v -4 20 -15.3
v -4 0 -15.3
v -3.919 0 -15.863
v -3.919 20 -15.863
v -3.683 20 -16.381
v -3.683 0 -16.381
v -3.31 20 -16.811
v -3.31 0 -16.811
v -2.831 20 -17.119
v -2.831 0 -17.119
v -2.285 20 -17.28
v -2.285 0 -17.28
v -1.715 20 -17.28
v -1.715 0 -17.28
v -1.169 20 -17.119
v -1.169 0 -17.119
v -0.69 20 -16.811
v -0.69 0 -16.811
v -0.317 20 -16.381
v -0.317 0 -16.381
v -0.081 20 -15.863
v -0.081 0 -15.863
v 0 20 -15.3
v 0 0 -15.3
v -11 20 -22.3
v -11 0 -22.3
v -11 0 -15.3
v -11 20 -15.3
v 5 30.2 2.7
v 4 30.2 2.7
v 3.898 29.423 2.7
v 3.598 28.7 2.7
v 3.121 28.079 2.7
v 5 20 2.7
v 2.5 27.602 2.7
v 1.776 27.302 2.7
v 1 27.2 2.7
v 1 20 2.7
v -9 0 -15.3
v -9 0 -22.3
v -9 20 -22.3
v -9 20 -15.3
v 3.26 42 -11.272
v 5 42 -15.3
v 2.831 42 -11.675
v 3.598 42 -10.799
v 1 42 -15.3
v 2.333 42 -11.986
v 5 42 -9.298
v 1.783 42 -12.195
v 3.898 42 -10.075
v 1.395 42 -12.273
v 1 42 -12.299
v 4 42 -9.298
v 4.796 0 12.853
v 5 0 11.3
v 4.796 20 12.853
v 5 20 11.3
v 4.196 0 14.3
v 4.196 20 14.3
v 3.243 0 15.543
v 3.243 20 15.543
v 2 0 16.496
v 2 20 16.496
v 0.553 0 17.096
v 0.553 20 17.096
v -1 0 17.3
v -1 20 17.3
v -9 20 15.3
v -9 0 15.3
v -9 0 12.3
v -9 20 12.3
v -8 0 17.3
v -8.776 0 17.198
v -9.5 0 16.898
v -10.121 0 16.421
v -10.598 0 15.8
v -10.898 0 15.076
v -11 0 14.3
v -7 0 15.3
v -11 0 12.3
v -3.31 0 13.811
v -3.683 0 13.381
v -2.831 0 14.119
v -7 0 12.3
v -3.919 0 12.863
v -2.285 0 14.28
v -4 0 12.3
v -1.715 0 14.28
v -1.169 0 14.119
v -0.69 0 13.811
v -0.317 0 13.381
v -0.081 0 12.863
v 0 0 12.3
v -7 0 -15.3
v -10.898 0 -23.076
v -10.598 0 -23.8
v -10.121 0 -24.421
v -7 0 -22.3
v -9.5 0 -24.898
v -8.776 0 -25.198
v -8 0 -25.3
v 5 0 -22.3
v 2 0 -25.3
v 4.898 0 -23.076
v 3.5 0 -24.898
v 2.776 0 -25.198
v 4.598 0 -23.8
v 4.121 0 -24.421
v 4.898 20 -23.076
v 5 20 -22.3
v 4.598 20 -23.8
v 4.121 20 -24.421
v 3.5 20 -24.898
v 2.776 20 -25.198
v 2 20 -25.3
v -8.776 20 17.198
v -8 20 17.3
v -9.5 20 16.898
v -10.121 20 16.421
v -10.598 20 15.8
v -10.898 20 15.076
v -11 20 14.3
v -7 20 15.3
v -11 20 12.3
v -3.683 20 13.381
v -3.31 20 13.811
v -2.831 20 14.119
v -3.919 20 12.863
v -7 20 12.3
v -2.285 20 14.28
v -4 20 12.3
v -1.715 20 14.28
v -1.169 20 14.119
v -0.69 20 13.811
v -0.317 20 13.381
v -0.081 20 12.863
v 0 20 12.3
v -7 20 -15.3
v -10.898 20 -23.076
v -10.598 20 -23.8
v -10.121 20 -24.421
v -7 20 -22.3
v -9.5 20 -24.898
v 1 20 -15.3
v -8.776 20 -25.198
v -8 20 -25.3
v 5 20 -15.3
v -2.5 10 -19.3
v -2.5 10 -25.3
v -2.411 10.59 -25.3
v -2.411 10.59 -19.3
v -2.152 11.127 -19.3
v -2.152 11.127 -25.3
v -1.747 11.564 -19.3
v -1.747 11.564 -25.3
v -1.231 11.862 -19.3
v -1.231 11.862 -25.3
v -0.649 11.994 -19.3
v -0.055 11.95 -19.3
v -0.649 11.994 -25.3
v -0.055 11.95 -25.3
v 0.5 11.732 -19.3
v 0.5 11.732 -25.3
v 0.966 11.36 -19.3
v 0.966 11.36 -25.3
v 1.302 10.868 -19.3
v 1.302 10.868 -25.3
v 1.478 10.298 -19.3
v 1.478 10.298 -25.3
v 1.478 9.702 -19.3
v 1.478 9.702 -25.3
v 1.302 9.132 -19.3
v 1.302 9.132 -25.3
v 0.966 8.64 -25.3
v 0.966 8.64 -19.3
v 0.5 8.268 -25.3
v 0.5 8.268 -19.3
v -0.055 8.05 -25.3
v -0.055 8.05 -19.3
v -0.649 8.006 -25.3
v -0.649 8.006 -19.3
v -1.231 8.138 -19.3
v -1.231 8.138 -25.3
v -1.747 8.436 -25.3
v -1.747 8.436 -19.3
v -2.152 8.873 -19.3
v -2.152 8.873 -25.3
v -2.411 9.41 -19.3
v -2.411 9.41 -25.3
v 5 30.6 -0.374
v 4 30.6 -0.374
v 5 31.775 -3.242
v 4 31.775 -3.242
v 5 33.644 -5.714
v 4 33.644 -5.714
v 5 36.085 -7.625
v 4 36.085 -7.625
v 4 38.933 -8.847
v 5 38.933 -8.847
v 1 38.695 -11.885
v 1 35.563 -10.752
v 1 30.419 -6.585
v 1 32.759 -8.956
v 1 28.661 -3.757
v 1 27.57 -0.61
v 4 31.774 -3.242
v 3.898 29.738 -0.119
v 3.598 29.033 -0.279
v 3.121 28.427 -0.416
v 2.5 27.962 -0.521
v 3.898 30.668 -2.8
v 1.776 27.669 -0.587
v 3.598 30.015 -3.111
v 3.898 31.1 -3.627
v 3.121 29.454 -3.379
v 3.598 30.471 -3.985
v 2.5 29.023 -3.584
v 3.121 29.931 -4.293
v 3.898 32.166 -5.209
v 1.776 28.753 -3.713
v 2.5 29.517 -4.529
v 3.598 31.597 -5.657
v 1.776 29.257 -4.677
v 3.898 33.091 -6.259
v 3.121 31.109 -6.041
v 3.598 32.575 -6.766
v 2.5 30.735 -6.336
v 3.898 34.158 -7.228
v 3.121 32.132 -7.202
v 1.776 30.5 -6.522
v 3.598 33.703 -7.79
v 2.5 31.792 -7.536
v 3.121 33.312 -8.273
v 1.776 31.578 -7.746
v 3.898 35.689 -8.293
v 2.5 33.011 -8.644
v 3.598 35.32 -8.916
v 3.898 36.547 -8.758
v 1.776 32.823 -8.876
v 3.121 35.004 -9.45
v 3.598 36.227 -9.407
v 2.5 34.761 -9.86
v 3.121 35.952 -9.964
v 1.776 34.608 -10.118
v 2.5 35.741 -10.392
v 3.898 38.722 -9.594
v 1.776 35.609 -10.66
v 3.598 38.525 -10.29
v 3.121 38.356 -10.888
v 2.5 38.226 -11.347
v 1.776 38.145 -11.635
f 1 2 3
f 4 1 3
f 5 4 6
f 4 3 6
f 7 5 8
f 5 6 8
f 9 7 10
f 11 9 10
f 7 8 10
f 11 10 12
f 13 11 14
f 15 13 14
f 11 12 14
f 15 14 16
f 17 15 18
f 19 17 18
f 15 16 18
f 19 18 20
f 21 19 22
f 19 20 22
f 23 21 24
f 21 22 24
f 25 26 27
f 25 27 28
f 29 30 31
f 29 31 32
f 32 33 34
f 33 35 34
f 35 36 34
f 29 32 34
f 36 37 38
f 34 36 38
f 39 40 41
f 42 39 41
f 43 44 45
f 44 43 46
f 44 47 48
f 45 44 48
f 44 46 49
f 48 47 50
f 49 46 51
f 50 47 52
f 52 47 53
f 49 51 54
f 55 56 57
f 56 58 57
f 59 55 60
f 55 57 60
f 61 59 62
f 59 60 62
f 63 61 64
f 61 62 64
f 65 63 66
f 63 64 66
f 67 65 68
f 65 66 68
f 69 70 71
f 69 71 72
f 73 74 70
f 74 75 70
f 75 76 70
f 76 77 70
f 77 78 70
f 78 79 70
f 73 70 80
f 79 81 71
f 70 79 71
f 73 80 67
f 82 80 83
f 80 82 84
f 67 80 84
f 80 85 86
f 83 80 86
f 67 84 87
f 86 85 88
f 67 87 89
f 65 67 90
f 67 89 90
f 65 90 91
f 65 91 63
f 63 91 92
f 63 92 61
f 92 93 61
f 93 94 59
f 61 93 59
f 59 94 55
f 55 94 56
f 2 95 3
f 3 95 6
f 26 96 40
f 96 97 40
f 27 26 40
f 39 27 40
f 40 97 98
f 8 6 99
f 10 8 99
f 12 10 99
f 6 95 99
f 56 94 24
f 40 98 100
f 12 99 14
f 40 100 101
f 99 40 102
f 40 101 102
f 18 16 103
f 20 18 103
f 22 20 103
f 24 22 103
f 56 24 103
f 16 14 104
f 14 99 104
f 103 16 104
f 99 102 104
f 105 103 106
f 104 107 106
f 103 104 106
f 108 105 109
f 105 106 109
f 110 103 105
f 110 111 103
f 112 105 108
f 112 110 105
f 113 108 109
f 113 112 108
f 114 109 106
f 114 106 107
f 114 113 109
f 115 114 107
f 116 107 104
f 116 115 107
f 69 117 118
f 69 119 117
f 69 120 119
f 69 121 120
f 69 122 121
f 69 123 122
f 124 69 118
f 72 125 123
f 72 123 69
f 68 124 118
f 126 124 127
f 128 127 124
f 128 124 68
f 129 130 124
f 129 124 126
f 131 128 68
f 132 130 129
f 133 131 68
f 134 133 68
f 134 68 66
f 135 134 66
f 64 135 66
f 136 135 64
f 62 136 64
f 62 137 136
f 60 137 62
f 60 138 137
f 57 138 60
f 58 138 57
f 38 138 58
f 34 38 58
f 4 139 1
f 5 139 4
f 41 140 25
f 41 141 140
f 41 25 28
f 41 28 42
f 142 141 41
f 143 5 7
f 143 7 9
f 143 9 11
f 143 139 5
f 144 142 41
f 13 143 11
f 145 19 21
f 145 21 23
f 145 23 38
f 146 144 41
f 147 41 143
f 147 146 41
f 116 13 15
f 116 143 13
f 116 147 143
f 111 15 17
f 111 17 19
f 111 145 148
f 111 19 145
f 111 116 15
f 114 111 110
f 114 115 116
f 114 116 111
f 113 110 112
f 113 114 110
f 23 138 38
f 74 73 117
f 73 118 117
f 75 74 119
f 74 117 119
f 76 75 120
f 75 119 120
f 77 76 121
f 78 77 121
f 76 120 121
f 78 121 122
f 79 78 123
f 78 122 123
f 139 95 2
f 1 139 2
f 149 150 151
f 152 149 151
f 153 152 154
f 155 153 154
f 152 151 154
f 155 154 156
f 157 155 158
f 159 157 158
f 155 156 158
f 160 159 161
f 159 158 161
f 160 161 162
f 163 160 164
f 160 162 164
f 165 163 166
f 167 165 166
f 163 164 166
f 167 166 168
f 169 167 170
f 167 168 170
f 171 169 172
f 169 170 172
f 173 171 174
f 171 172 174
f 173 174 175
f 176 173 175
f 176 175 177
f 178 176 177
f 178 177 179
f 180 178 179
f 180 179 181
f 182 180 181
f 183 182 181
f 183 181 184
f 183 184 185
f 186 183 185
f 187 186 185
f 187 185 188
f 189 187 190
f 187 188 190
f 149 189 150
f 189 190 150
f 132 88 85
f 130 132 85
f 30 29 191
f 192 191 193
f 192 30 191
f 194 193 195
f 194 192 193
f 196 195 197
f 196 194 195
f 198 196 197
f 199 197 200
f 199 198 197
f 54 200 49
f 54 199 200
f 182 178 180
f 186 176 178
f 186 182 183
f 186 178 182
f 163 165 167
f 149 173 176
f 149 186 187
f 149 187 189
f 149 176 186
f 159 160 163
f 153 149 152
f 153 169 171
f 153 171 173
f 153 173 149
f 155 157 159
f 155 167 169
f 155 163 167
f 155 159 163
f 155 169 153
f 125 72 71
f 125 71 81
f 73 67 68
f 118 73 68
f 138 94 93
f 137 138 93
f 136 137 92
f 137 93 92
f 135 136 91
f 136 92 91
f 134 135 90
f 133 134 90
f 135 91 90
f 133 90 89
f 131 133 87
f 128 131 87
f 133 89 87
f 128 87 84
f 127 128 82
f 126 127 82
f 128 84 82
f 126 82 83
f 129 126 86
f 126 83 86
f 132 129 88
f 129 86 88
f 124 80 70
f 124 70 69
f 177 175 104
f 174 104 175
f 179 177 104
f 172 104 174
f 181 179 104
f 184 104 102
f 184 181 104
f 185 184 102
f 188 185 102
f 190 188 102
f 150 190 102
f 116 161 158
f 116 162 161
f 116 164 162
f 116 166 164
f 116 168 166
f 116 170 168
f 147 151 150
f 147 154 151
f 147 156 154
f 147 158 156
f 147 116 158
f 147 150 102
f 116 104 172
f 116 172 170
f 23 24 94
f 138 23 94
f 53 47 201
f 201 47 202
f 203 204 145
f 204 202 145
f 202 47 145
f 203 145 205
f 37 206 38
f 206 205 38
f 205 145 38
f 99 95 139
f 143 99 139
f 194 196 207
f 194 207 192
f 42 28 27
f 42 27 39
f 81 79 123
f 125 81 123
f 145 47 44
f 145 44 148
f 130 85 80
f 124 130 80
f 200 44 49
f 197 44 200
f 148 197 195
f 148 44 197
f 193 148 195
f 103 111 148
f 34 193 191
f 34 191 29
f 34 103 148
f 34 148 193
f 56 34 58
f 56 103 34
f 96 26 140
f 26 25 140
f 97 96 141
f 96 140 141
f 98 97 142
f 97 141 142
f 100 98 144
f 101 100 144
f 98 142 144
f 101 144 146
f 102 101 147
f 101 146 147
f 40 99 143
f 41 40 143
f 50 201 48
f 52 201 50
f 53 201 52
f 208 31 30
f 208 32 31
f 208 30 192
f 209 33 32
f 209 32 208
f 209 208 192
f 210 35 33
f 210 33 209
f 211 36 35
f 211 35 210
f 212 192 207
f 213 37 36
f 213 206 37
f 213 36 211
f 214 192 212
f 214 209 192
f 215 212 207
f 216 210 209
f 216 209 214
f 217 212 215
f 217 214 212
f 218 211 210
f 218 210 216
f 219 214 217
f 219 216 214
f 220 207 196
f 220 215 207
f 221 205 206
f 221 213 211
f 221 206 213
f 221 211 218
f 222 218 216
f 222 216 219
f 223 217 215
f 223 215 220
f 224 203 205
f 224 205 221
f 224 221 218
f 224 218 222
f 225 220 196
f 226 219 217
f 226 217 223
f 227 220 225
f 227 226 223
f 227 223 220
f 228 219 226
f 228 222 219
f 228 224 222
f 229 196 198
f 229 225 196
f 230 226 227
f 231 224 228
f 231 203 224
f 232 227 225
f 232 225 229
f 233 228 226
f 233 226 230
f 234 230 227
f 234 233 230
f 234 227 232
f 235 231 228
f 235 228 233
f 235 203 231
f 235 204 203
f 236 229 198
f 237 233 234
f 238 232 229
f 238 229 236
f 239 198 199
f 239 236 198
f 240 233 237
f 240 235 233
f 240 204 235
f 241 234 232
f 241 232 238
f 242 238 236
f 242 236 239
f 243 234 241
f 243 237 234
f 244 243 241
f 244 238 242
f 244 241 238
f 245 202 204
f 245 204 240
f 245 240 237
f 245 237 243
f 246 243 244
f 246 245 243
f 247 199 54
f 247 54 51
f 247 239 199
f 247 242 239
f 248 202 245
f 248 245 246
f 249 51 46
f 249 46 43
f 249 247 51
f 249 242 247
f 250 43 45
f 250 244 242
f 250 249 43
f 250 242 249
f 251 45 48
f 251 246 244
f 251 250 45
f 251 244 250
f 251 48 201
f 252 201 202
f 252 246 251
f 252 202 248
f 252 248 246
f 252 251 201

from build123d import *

# Parameters (mm, degrees)
BOSS_EXTRUDE1_DEPTH  = 20
SKETCH3_W            = 12
SKETCH3_H            = 20
BOSS_EXTRUDE2_DEPTH  = 5
FILLET1_R            = 6
FILLET2_R            = 3
SKETCH4_R            = 2
CUT_EXTRUDE1_DEPTH   = 6
SKETCH5_W            = 2
SKETCH5_H            = 20
SKETCH5_W_2          = 3
BOSS_EXTRUDE3_DEPTH  = 4
SKETCH6_W            = 2
SKETCH6_H            = 20
BOSS_EXTRUDE4_DEPTH  = 3
SKETCH7_W            = 2
SKETCH7_H            = 20
BOSS_EXTRUDE5_DEPTH  = 7
FILLET3_R            = 3
SKETCH8_W            = 18
SKETCH8_H            = 22
BOSS_EXTRUDE6_DEPTH  = 5
CUT_EXTRUDE2_START   = -4
CUT_EXTRUDE2_DEPTH   = 40.285832851
CUT_EXTRUDE3_DEPTH   = 36.285832851
FILLET4_R            = 3
SKETCH11_W           = 18
SKETCH11_H           = 22
CUT_EXTRUDE4_DEPTH   = 1
FILLET5_R            = 3
FILLET4_OF_MIRROR1_R = 3
SKETCH12_W           = 16.003556493
SKETCH12_H           = 33.094462643
CUT_EXTRUDE5_DEPTH   = 22


with BuildPart() as part:
    # Sketch1 → Boss-Extrude1 (new body)
    with BuildSketch(Plane(origin=(0, 0, 0), x_dir=(1, 0, 0), z_dir=(0, 1, 0))):
        with BuildLine():
            Line((0, 15.3), (0, -12.3))
            ThreePointArc((0, -12.3), (-2, -14.3), (-4, -12.3))
            Line((-4, -12.3), (-7, -12.3))
            Line((-7, -12.3), (-7, -17.3))
            Line((-7, -17.3), (5, -17.3))
            Line((5, -17.3), (5, 20.3))
            Line((5, 20.3), (-7, 20.3))
            Line((-7, 20.3), (-7, 15.3))
            Line((-7, 15.3), (-4, 15.3))
            ThreePointArc((-4, 15.3), (-2, 17.3), (0, 15.3))
        make_face()
    extrude(amount=BOSS_EXTRUDE1_DEPTH)

    # Sketch3 → Boss-Extrude2 (add)
    with BuildSketch(Plane(origin=(0, 0, -20.3), x_dir=(-1, 0, 0), z_dir=(0, 0, -1))):
        with Locations((1, 10)):
            Rectangle(SKETCH3_W, SKETCH3_H)
    extrude(amount=BOSS_EXTRUDE2_DEPTH)

    # Fillet1
    fillet1_edges = [part.edges().sort_by_distance(p)[0] for p in [
        (5, 10, 17.3),
    ]]
    fillet(fillet1_edges, radius=FILLET1_R)

    # Fillet2
    fillet2_edges = [part.edges().sort_by_distance(p)[0] for p in [
        (5, 10, -25.3),
    ]]
    fillet(fillet2_edges, radius=FILLET2_R)

    # Sketch4 → Cut-Extrude1 (cut)
    with BuildSketch(Plane(origin=(0, 0, -25.3), x_dir=(-1, 0, 0), z_dir=(0, 0, -1))):
        with Locations((0.5, 10)):
            Circle(SKETCH4_R)
    extrude(amount=-CUT_EXTRUDE1_DEPTH, mode=Mode.SUBTRACT)

    # Sketch5 → Boss-Extrude3 (add)
    with BuildSketch(Plane.ZY.offset(7)):
        with Locations((16.3, 10)):
            Rectangle(SKETCH5_W, SKETCH5_H)
        with Locations((-23.8, 10)):
            Rectangle(SKETCH5_W_2, SKETCH5_H)
    extrude(amount=BOSS_EXTRUDE3_DEPTH)

    # Sketch6 → Boss-Extrude4 (add)
    with BuildSketch(Plane(origin=(0, 0, 15.3), x_dir=(-1, 0, 0), z_dir=(0, 0, -1))):
        with Locations((10, 10)):
            Rectangle(SKETCH6_W, SKETCH6_H)
    extrude(amount=BOSS_EXTRUDE4_DEPTH)

    # Sketch7 → Boss-Extrude5 (add)
    with BuildSketch(Plane.XY.offset(-22.3)):
        with Locations((-10, 10)):
            Rectangle(SKETCH7_W, SKETCH7_H)
    extrude(amount=BOSS_EXTRUDE5_DEPTH)

    # Fillet3
    fillet3_edges = [part.edges().sort_by_distance(p)[0] for p in [
        (-11, 10, 17.3),
        (-11, 10, -25.3),
    ]]
    fillet(fillet3_edges, radius=FILLET3_R)

    # Sketch8 → Boss-Extrude6 (add)
    with BuildSketch(Plane.ZY):
        with Locations((-6.3, -11)):
            Rectangle(SKETCH8_W, SKETCH8_H)
    boss_extrude6 = extrude(amount=-BOSS_EXTRUDE6_DEPTH)

    # Sketch9 → Cut-Extrude2 (cut)
    with BuildSketch(Plane.ZY.offset(CUT_EXTRUDE2_START)):
        with BuildLine():
            Line((2.7, -10.2), (2.7, -7.2))
            ThreePointArc((2.7, -7.2), (-7.835653753, -11.522921748), (-12.298666607, -22))
            Line((-12.298666607, -22), (-9.298333218, -22))
            ThreePointArc((-9.298333218, -22), (-5.714273587, -13.644300146), (2.7, -10.2))
        make_face()
    cut_extrude2 = extrude(amount=CUT_EXTRUDE2_DEPTH, mode=Mode.SUBTRACT)

    # Sketch9<3> → Cut-Extrude3 (cut, symmetric)
    with BuildSketch(Plane.ZY):
        with BuildLine():
            Line((2.7, -22), (2.7, -10.2))
            ThreePointArc((2.7, -10.2), (-5.714273587, -13.644300146), (-9.298333218, -22))
            Line((-9.298333218, -22), (2.7, -22))
        make_face()
    cut_extrude3 = extrude(amount=CUT_EXTRUDE3_DEPTH, both=True, mode=Mode.SUBTRACT)

    # Fillet4
    fillet4_edges = [part.edges().sort_by_distance(p)[0] for p in [
        (4, -11.522921748, -7.835653753),
    ]]
    fillet(fillet4_edges, radius=FILLET4_R - 0.0001)  # a hair under: the kernel refuses the full size

    # Sketch11 → Cut-Extrude4 (cut)
    with BuildSketch(Plane.ZY):
        with Locations((-6.3, -11)):
            Rectangle(SKETCH11_W, SKETCH11_H)
    cut_extrude4 = extrude(amount=-CUT_EXTRUDE4_DEPTH, mode=Mode.SUBTRACT)

    # Fillet5
    fillet5_edges = [part.edges().sort_by_distance(p)[0] for p in [
        (3, 0, -15.3),
        (3, 0, 2.7),
    ]]
    fillet(fillet5_edges, radius=FILLET5_R)

    # Mirror1: Boss-Extrude6, Cut-Extrude2, Cut-Extrude3, Cut-Extrude4 across plane
    add(boss_extrude6.mirror(Plane(origin=(0, 10, 0), x_dir=(0, 0, 1), z_dir=(0, -1, 0))))
    add(cut_extrude2.mirror(Plane(origin=(0, 10, 0), x_dir=(0, 0, 1), z_dir=(0, -1, 0))), mode=Mode.SUBTRACT)
    add(cut_extrude3.mirror(Plane(origin=(0, 10, 0), x_dir=(0, 0, 1), z_dir=(0, -1, 0))), mode=Mode.SUBTRACT)
    add(cut_extrude4.mirror(Plane(origin=(0, 10, 0), x_dir=(0, 0, 1), z_dir=(0, -1, 0))), mode=Mode.SUBTRACT)

    # Fillet4 of Mirror1
    fillet4_of_mirror1_edges = [part.edges().sort_by_distance(p)[0] for p in [
        (4, 31.522921748, -7.835653753),
    ]]
    fillet(fillet4_of_mirror1_edges, radius=FILLET4_OF_MIRROR1_R - 0.0001)  # a hair under: the kernel refuses the full size

    # Sketch12 → Cut-Extrude5 (cut)
    with BuildSketch(Plane.XZ.offset(22)):
        with Locations((1.208141139, -2.187750571)):
            Rectangle(SKETCH12_W, SKETCH12_H)
    extrude(amount=-CUT_EXTRUDE5_DEPTH, mode=Mode.SUBTRACT)


solid = part.part
